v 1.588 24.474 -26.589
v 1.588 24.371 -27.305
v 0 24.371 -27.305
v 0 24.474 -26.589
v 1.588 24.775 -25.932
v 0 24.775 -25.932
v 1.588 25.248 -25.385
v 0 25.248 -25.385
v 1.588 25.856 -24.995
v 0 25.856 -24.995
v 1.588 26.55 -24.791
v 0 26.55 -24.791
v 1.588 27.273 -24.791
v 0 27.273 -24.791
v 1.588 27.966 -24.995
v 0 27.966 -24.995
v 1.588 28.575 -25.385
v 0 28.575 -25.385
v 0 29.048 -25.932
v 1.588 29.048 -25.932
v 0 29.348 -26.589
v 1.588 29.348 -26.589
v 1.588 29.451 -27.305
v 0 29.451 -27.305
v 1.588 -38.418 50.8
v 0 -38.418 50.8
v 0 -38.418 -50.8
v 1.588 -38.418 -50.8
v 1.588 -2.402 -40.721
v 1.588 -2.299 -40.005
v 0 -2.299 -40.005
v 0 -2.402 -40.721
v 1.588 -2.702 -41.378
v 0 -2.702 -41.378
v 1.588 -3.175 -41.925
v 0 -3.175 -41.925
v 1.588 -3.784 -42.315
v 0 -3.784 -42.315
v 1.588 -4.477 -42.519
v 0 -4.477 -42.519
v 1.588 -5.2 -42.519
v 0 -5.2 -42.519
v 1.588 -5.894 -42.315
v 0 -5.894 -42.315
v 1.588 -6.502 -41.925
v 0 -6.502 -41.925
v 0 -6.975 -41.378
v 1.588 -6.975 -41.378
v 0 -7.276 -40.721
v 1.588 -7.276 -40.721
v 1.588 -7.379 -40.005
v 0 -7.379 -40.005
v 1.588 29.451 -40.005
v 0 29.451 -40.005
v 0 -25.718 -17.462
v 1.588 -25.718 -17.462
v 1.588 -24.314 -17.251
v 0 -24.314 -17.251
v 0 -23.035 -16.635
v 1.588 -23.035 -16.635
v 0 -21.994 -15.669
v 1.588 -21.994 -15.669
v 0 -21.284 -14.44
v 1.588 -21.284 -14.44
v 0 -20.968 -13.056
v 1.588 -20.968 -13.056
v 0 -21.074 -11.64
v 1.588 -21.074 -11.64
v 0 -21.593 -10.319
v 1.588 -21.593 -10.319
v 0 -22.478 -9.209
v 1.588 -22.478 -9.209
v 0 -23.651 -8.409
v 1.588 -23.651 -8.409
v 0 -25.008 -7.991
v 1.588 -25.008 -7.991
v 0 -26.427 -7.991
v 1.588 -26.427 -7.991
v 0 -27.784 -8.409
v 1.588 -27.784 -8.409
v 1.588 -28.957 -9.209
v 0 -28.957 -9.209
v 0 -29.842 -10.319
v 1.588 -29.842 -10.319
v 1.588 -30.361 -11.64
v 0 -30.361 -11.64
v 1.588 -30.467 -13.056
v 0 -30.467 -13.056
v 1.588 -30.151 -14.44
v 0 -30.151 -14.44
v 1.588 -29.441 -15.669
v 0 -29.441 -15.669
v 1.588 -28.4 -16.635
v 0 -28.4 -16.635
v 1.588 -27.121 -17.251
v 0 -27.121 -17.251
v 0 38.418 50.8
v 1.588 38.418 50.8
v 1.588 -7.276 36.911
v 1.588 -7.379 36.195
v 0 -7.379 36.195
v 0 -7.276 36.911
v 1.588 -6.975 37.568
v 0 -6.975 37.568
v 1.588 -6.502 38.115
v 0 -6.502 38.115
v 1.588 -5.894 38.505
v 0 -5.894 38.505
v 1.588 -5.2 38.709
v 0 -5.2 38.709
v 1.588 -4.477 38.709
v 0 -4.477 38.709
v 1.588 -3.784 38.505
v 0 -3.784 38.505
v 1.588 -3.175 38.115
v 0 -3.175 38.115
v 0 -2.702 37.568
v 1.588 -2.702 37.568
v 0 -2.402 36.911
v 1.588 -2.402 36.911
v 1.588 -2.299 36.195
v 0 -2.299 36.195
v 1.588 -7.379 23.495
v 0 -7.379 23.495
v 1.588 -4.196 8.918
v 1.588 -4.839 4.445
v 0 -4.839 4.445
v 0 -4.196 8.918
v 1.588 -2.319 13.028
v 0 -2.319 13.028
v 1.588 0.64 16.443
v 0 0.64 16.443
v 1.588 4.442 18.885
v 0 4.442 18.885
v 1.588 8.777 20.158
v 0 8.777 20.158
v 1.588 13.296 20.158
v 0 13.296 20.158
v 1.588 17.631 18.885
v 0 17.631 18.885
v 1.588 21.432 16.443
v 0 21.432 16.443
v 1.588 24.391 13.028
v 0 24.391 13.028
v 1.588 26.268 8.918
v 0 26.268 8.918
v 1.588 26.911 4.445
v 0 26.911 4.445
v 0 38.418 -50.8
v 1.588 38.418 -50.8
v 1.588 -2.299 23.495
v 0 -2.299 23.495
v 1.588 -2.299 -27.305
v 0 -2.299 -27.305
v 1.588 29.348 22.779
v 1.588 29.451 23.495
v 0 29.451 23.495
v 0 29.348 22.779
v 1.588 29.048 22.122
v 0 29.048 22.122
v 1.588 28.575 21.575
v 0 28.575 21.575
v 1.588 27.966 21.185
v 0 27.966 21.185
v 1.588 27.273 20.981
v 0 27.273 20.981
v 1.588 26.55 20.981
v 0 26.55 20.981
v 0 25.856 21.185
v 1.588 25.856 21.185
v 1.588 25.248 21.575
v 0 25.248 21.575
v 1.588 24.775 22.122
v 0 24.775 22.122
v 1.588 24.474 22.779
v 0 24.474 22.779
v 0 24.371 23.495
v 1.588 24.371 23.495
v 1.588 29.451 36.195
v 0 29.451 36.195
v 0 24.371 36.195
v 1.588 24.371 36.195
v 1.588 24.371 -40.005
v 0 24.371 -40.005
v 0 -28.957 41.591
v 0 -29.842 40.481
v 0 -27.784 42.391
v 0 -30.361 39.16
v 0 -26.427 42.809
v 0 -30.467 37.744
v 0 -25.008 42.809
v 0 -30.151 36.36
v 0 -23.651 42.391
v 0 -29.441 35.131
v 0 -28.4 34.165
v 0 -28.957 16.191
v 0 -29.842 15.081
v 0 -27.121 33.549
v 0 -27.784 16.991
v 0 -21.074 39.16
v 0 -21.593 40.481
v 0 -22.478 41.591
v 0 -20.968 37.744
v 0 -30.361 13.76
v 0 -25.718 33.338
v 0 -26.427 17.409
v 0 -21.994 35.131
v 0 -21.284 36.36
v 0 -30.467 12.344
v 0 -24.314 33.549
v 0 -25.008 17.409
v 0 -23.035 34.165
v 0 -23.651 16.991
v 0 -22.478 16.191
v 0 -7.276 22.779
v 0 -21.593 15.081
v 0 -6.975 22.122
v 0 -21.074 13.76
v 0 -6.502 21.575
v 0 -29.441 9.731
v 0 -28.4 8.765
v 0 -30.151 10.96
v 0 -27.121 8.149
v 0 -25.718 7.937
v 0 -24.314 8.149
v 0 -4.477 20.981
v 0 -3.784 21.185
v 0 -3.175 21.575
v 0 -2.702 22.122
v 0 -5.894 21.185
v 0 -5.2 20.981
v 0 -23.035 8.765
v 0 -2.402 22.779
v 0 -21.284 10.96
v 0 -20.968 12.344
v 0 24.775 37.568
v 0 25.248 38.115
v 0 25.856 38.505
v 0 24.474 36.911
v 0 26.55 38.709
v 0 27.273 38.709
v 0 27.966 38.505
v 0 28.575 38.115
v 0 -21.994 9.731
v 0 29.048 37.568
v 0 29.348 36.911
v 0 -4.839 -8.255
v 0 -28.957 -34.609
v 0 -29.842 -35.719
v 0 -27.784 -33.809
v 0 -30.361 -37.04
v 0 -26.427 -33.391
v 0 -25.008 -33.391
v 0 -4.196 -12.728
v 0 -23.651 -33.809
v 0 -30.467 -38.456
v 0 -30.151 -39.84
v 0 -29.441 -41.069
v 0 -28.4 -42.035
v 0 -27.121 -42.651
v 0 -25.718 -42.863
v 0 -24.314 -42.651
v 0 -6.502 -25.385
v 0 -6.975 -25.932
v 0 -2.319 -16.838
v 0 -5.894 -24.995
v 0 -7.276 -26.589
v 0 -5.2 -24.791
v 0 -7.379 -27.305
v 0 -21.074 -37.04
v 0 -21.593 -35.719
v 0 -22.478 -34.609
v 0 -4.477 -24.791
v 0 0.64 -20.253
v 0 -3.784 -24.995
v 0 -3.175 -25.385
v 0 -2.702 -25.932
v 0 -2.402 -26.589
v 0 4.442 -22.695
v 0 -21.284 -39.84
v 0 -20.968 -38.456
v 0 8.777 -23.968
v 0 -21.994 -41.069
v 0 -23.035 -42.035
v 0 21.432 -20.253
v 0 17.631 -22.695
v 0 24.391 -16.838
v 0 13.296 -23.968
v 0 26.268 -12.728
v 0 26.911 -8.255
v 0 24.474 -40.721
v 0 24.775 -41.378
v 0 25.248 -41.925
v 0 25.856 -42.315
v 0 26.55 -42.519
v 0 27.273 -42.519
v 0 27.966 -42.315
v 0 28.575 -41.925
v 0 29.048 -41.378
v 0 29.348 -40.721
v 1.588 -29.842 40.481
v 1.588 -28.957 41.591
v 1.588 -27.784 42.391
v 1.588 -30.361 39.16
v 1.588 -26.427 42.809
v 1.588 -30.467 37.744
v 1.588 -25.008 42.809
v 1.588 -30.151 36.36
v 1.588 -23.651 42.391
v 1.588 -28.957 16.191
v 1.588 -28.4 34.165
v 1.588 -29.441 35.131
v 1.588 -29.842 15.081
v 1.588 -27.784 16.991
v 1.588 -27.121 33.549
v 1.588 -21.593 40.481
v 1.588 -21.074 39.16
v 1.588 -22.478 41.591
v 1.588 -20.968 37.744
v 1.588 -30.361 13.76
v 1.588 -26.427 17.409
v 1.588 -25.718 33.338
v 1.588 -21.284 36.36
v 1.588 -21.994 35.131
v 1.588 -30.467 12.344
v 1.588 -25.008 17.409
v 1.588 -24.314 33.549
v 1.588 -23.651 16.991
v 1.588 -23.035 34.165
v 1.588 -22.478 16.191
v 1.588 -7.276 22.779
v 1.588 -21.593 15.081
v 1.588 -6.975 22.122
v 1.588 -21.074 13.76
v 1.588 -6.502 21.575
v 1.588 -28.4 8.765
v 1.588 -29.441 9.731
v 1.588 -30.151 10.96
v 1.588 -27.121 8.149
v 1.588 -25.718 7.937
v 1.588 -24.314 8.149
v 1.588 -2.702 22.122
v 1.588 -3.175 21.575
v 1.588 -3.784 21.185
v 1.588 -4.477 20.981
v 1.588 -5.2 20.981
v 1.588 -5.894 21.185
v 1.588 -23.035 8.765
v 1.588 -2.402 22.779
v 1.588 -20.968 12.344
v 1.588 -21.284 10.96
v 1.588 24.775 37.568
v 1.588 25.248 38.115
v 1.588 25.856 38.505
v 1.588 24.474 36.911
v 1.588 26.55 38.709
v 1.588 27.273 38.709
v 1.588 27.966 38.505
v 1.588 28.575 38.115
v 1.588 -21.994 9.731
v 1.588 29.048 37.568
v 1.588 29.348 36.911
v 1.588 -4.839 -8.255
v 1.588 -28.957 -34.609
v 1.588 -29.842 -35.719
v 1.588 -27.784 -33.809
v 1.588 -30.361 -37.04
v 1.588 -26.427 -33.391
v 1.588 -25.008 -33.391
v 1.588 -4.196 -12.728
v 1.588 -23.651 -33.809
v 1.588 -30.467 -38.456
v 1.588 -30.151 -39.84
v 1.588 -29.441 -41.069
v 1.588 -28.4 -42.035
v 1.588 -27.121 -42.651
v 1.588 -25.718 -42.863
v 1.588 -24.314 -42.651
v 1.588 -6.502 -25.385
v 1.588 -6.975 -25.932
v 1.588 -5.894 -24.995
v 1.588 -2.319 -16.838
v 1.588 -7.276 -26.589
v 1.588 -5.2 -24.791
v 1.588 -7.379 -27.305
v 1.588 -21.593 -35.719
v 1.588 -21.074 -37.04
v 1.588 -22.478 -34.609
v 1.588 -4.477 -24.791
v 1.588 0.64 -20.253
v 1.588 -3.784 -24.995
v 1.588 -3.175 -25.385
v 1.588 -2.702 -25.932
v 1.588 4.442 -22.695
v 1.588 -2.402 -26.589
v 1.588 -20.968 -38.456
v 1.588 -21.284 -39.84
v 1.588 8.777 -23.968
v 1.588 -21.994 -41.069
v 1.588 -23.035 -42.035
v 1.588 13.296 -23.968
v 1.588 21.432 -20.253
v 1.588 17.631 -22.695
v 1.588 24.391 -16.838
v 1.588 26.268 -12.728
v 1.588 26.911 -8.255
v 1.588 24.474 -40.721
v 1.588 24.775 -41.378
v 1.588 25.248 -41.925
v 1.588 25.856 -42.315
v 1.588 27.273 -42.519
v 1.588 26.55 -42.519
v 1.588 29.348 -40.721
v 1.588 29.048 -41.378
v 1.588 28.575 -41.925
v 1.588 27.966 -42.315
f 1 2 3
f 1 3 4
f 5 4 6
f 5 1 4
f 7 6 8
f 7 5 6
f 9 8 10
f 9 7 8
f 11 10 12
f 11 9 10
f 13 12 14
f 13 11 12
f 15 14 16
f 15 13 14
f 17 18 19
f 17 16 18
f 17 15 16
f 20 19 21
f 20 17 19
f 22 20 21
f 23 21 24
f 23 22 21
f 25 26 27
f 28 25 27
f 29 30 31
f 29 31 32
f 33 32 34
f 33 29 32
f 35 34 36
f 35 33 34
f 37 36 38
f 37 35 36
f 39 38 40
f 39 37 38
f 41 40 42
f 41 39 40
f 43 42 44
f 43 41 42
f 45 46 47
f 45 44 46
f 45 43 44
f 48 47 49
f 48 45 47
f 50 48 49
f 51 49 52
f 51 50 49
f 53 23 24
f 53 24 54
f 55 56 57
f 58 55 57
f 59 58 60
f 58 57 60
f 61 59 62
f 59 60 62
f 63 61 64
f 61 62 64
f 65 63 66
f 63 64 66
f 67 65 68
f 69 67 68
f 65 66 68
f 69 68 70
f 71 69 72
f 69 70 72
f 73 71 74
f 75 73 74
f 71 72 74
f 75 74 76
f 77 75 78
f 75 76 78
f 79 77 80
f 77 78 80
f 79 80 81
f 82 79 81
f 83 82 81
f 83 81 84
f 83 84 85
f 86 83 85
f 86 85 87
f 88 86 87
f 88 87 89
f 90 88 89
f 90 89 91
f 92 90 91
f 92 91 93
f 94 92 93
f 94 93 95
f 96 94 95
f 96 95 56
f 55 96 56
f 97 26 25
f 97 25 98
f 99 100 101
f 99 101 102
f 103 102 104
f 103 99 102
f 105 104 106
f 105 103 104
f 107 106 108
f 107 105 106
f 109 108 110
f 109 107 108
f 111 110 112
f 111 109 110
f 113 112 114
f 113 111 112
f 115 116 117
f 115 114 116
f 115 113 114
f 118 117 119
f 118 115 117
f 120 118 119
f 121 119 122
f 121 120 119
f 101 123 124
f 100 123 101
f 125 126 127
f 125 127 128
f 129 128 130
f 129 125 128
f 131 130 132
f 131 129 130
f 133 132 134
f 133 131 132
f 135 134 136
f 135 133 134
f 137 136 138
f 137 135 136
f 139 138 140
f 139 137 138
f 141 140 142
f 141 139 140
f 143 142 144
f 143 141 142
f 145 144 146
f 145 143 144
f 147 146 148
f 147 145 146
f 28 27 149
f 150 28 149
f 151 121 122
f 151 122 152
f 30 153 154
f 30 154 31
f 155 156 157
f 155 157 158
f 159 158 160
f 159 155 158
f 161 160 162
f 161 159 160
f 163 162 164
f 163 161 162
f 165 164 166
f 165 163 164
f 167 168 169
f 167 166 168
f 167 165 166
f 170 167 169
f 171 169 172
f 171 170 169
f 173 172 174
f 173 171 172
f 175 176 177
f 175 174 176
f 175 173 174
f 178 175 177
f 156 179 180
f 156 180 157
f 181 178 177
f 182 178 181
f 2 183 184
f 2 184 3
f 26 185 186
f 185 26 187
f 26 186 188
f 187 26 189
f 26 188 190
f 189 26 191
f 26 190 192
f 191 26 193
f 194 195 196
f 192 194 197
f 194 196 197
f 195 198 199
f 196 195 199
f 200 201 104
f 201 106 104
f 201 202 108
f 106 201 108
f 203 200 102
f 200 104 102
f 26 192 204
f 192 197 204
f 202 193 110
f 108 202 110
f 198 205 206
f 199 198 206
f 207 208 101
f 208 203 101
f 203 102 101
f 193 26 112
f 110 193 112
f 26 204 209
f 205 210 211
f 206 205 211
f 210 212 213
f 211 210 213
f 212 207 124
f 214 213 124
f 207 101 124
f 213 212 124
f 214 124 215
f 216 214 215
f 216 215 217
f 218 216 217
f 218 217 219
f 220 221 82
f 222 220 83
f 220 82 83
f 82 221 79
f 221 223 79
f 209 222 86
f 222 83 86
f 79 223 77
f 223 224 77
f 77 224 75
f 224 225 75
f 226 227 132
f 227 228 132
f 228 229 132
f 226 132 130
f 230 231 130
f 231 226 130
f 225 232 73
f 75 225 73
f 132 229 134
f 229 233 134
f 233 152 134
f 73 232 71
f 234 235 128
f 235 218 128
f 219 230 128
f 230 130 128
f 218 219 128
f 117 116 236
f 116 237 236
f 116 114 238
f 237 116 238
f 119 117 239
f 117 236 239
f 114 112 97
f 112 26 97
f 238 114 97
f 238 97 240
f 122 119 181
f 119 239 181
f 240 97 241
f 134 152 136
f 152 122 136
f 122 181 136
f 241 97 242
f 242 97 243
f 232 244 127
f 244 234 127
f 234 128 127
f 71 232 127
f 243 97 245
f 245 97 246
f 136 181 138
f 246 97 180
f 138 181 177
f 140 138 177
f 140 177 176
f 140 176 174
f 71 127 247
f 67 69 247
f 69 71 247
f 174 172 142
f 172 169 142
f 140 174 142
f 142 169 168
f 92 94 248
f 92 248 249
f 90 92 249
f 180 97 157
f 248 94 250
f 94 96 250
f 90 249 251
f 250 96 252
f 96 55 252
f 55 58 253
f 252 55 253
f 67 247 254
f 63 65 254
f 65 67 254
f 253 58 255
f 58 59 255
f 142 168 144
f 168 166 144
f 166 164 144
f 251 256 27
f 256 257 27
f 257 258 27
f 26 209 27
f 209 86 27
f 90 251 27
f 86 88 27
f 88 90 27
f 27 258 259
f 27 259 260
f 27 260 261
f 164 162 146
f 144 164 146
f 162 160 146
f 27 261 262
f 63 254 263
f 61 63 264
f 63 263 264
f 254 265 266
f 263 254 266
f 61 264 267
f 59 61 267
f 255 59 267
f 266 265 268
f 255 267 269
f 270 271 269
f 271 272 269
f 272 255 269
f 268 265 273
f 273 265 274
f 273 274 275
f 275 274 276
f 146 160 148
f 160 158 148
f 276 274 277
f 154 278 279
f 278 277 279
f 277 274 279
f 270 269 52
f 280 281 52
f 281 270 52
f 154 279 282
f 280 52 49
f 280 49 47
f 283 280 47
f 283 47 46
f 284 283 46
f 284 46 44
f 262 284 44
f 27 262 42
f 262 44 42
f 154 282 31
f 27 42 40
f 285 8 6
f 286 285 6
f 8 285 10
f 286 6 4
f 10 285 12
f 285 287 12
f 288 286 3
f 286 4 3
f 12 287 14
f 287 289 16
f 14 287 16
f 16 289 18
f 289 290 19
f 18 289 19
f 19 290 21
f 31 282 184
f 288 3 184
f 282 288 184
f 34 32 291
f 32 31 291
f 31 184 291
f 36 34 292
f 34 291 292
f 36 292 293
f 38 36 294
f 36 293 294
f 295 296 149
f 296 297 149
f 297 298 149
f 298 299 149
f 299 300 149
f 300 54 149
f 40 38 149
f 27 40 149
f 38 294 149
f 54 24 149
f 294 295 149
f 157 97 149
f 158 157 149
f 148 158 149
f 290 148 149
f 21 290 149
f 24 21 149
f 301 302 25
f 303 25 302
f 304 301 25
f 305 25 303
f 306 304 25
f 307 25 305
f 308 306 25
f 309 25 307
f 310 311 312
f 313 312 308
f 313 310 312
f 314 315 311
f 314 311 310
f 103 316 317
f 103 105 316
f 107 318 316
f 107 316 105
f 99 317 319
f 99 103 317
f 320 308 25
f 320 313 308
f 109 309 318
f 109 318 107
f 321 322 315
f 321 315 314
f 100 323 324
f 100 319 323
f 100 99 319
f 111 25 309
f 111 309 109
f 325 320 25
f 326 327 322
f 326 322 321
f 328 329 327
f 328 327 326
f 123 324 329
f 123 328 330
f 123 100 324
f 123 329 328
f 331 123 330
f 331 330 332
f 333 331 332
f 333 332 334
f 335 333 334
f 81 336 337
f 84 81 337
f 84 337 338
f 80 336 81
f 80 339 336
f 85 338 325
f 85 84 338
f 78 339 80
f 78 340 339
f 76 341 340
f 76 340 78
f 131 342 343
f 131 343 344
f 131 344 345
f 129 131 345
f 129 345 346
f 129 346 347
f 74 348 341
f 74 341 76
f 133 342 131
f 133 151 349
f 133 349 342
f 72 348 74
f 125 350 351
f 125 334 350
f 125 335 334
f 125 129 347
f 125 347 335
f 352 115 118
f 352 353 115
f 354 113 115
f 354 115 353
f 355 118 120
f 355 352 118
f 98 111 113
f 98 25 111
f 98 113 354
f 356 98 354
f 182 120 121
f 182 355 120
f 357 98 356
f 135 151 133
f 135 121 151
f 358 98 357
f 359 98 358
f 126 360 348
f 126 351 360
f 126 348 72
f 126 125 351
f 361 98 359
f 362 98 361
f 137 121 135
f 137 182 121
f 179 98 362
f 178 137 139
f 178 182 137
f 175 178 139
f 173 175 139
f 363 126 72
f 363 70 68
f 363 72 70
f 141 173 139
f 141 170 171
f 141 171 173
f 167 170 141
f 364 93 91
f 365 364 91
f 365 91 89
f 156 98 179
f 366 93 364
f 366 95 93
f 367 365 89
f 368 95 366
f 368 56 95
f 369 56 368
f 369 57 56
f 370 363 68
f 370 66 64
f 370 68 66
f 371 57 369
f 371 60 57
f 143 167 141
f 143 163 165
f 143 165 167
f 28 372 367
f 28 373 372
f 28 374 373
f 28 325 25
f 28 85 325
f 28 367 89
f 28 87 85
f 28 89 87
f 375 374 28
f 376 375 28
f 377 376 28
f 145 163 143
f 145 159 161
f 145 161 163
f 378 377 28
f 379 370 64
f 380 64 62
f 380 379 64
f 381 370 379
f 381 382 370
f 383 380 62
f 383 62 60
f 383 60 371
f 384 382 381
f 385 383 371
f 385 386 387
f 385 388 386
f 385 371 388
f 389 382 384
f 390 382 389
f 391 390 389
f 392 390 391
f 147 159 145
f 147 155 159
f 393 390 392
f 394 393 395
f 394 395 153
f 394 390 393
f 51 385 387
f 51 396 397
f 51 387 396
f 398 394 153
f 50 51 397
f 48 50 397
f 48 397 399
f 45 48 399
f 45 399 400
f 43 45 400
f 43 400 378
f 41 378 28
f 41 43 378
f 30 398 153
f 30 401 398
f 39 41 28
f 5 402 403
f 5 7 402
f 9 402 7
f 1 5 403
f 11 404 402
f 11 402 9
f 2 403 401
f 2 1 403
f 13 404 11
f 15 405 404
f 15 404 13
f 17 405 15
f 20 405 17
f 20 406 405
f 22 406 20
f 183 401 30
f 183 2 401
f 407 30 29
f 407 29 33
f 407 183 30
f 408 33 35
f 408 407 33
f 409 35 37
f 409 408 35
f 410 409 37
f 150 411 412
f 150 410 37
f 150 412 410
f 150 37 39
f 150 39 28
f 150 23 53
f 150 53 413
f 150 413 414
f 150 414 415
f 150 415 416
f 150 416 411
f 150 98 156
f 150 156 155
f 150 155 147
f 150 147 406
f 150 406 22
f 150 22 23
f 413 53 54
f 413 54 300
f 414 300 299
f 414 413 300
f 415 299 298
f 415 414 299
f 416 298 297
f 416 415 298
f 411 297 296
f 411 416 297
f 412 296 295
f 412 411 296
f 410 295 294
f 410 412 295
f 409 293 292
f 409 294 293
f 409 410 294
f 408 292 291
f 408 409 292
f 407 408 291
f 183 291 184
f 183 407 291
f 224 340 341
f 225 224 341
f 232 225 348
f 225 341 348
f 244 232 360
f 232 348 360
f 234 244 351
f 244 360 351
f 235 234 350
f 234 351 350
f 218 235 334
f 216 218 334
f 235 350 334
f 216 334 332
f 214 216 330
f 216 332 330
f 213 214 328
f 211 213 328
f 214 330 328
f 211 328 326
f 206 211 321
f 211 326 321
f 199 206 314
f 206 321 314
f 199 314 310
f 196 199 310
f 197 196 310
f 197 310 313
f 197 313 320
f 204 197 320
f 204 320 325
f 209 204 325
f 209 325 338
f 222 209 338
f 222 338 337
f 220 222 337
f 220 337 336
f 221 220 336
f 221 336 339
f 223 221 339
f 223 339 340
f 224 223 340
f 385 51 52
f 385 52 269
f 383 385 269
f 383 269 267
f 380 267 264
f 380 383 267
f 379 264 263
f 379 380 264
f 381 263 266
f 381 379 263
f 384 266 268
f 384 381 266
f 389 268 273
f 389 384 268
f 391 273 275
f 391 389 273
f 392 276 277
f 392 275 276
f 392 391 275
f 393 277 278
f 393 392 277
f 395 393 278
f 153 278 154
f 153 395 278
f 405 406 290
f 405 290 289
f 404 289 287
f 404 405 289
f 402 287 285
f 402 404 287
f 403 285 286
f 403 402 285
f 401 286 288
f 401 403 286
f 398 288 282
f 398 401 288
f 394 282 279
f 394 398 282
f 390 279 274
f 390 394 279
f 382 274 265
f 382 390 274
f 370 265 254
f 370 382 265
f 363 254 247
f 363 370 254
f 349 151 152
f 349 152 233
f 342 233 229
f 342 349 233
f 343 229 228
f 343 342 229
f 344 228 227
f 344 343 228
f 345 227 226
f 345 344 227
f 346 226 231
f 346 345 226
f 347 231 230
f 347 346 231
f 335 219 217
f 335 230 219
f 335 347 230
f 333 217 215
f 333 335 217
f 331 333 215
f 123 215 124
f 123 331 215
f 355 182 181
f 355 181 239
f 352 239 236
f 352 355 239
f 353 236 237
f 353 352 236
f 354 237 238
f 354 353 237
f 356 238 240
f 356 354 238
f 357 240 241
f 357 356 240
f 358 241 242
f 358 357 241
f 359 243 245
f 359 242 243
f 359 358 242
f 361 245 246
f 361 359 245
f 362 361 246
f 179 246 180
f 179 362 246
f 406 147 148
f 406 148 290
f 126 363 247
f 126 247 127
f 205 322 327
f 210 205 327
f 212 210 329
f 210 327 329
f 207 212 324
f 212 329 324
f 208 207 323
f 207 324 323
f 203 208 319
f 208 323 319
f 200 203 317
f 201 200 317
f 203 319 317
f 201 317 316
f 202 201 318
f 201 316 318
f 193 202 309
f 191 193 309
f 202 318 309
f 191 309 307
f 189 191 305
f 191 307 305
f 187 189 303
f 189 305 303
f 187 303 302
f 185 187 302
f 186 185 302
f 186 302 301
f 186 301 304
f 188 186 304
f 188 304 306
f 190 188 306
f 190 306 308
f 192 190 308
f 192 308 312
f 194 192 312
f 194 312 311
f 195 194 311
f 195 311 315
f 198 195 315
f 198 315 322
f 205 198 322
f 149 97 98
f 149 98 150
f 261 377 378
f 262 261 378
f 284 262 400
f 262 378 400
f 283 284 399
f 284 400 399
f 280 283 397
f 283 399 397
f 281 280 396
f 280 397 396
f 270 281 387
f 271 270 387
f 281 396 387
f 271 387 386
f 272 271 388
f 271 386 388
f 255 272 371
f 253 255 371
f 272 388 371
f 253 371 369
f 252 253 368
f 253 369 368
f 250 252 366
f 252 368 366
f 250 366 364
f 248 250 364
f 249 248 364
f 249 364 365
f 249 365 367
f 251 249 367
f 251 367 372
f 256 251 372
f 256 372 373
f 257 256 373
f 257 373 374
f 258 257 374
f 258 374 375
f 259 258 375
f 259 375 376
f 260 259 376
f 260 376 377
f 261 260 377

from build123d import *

# Parameters (mm, degrees)
SKETCH1_W           = 101.6
SKETCH1_H           = 76.835
BOSS_EXTRUDE1_DEPTH = 1.5875
SKETCH2_R           = 4.7625
CUT_EXTRUDE1_DEPTH  = 2.5875


with BuildPart() as part:
    # Sketch1 → Boss-Extrude1 (new body)
    with BuildSketch(Plane(origin=(0, 0, 0), x_dir=(0, 0, -1), z_dir=(1, 0, 0))):
        Rectangle(SKETCH1_W, SKETCH1_H)
    extrude(amount=BOSS_EXTRUDE1_DEPTH)

    # Sketch2 → Cut-Extrude1 (cut, through all)
    with BuildSketch(Plane(origin=(1.5875, 0, 0), x_dir=(0, 0, -1), z_dir=(1, 0, 0))):
        with Locations((-38.1, -25.7175)):
            Circle(SKETCH2_R)
        with Locations((-12.7, -25.7175)):
            Circle(SKETCH2_R)
        with Locations((12.7, -25.7175)):
            Circle(SKETCH2_R)
        with Locations((38.1, -25.7175)):
            Circle(SKETCH2_R)
        with BuildLine():
            Line((-36.195, -2.2987), (-23.495, -2.2987))
            ThreePointArc((-23.495, -2.2987), (-20.955, -4.8387), (-23.495, -7.3787))
            Line((-23.495, -7.3787), (-36.195, -7.3787))
            ThreePointArc((-36.195, -7.3787), (-38.735, -4.8387), (-36.195, -2.2987))
        make_face()
        with BuildLine():
            Line((27.305, -2.2987), (40.005, -2.2987))
            ThreePointArc((40.005, -2.2987), (42.545, -4.8387), (40.005, -7.3787))
            Line((40.005, -7.3787), (27.305, -7.3787))
            ThreePointArc((27.305, -7.3787), (24.765, -4.8387), (27.305, -2.2987))
        make_face()
        with BuildLine():
            Line((27.305, 29.4513), (40.005, 29.4513))
            ThreePointArc((40.005, 29.4513), (42.545, 26.9113), (40.005, 24.3713))
            Line((40.005, 24.3713), (27.305, 24.3713))
            ThreePointArc((27.305, 24.3713), (24.765, 26.9113), (27.305, 29.4513))
        make_face()
        with BuildLine():
            Line((-36.195, 29.4513), (-23.495, 29.4513))
            ThreePointArc((-23.495, 29.4513), (-20.955, 26.9113), (-23.495, 24.3713))
            Line((-23.495, 24.3713), (-36.195, 24.3713))
            ThreePointArc((-36.195, 24.3713), (-38.735, 26.9113), (-36.195, 29.4513))
        make_face()
        with BuildLine():
            Line((-4.445, 26.9113), (8.255, 26.9113))
            ThreePointArc((8.255, 26.9113), (24.13, 11.0363), (8.255, -4.8387))
            Line((8.255, -4.8387), (-4.445, -4.8387))
            ThreePointArc((-4.445, -4.8387), (-20.32, 11.0363), (-4.445, 26.9113))
        make_face()
    extrude(amount=-CUT_EXTRUDE1_DEPTH, mode=Mode.SUBTRACT)


solid = part.part
